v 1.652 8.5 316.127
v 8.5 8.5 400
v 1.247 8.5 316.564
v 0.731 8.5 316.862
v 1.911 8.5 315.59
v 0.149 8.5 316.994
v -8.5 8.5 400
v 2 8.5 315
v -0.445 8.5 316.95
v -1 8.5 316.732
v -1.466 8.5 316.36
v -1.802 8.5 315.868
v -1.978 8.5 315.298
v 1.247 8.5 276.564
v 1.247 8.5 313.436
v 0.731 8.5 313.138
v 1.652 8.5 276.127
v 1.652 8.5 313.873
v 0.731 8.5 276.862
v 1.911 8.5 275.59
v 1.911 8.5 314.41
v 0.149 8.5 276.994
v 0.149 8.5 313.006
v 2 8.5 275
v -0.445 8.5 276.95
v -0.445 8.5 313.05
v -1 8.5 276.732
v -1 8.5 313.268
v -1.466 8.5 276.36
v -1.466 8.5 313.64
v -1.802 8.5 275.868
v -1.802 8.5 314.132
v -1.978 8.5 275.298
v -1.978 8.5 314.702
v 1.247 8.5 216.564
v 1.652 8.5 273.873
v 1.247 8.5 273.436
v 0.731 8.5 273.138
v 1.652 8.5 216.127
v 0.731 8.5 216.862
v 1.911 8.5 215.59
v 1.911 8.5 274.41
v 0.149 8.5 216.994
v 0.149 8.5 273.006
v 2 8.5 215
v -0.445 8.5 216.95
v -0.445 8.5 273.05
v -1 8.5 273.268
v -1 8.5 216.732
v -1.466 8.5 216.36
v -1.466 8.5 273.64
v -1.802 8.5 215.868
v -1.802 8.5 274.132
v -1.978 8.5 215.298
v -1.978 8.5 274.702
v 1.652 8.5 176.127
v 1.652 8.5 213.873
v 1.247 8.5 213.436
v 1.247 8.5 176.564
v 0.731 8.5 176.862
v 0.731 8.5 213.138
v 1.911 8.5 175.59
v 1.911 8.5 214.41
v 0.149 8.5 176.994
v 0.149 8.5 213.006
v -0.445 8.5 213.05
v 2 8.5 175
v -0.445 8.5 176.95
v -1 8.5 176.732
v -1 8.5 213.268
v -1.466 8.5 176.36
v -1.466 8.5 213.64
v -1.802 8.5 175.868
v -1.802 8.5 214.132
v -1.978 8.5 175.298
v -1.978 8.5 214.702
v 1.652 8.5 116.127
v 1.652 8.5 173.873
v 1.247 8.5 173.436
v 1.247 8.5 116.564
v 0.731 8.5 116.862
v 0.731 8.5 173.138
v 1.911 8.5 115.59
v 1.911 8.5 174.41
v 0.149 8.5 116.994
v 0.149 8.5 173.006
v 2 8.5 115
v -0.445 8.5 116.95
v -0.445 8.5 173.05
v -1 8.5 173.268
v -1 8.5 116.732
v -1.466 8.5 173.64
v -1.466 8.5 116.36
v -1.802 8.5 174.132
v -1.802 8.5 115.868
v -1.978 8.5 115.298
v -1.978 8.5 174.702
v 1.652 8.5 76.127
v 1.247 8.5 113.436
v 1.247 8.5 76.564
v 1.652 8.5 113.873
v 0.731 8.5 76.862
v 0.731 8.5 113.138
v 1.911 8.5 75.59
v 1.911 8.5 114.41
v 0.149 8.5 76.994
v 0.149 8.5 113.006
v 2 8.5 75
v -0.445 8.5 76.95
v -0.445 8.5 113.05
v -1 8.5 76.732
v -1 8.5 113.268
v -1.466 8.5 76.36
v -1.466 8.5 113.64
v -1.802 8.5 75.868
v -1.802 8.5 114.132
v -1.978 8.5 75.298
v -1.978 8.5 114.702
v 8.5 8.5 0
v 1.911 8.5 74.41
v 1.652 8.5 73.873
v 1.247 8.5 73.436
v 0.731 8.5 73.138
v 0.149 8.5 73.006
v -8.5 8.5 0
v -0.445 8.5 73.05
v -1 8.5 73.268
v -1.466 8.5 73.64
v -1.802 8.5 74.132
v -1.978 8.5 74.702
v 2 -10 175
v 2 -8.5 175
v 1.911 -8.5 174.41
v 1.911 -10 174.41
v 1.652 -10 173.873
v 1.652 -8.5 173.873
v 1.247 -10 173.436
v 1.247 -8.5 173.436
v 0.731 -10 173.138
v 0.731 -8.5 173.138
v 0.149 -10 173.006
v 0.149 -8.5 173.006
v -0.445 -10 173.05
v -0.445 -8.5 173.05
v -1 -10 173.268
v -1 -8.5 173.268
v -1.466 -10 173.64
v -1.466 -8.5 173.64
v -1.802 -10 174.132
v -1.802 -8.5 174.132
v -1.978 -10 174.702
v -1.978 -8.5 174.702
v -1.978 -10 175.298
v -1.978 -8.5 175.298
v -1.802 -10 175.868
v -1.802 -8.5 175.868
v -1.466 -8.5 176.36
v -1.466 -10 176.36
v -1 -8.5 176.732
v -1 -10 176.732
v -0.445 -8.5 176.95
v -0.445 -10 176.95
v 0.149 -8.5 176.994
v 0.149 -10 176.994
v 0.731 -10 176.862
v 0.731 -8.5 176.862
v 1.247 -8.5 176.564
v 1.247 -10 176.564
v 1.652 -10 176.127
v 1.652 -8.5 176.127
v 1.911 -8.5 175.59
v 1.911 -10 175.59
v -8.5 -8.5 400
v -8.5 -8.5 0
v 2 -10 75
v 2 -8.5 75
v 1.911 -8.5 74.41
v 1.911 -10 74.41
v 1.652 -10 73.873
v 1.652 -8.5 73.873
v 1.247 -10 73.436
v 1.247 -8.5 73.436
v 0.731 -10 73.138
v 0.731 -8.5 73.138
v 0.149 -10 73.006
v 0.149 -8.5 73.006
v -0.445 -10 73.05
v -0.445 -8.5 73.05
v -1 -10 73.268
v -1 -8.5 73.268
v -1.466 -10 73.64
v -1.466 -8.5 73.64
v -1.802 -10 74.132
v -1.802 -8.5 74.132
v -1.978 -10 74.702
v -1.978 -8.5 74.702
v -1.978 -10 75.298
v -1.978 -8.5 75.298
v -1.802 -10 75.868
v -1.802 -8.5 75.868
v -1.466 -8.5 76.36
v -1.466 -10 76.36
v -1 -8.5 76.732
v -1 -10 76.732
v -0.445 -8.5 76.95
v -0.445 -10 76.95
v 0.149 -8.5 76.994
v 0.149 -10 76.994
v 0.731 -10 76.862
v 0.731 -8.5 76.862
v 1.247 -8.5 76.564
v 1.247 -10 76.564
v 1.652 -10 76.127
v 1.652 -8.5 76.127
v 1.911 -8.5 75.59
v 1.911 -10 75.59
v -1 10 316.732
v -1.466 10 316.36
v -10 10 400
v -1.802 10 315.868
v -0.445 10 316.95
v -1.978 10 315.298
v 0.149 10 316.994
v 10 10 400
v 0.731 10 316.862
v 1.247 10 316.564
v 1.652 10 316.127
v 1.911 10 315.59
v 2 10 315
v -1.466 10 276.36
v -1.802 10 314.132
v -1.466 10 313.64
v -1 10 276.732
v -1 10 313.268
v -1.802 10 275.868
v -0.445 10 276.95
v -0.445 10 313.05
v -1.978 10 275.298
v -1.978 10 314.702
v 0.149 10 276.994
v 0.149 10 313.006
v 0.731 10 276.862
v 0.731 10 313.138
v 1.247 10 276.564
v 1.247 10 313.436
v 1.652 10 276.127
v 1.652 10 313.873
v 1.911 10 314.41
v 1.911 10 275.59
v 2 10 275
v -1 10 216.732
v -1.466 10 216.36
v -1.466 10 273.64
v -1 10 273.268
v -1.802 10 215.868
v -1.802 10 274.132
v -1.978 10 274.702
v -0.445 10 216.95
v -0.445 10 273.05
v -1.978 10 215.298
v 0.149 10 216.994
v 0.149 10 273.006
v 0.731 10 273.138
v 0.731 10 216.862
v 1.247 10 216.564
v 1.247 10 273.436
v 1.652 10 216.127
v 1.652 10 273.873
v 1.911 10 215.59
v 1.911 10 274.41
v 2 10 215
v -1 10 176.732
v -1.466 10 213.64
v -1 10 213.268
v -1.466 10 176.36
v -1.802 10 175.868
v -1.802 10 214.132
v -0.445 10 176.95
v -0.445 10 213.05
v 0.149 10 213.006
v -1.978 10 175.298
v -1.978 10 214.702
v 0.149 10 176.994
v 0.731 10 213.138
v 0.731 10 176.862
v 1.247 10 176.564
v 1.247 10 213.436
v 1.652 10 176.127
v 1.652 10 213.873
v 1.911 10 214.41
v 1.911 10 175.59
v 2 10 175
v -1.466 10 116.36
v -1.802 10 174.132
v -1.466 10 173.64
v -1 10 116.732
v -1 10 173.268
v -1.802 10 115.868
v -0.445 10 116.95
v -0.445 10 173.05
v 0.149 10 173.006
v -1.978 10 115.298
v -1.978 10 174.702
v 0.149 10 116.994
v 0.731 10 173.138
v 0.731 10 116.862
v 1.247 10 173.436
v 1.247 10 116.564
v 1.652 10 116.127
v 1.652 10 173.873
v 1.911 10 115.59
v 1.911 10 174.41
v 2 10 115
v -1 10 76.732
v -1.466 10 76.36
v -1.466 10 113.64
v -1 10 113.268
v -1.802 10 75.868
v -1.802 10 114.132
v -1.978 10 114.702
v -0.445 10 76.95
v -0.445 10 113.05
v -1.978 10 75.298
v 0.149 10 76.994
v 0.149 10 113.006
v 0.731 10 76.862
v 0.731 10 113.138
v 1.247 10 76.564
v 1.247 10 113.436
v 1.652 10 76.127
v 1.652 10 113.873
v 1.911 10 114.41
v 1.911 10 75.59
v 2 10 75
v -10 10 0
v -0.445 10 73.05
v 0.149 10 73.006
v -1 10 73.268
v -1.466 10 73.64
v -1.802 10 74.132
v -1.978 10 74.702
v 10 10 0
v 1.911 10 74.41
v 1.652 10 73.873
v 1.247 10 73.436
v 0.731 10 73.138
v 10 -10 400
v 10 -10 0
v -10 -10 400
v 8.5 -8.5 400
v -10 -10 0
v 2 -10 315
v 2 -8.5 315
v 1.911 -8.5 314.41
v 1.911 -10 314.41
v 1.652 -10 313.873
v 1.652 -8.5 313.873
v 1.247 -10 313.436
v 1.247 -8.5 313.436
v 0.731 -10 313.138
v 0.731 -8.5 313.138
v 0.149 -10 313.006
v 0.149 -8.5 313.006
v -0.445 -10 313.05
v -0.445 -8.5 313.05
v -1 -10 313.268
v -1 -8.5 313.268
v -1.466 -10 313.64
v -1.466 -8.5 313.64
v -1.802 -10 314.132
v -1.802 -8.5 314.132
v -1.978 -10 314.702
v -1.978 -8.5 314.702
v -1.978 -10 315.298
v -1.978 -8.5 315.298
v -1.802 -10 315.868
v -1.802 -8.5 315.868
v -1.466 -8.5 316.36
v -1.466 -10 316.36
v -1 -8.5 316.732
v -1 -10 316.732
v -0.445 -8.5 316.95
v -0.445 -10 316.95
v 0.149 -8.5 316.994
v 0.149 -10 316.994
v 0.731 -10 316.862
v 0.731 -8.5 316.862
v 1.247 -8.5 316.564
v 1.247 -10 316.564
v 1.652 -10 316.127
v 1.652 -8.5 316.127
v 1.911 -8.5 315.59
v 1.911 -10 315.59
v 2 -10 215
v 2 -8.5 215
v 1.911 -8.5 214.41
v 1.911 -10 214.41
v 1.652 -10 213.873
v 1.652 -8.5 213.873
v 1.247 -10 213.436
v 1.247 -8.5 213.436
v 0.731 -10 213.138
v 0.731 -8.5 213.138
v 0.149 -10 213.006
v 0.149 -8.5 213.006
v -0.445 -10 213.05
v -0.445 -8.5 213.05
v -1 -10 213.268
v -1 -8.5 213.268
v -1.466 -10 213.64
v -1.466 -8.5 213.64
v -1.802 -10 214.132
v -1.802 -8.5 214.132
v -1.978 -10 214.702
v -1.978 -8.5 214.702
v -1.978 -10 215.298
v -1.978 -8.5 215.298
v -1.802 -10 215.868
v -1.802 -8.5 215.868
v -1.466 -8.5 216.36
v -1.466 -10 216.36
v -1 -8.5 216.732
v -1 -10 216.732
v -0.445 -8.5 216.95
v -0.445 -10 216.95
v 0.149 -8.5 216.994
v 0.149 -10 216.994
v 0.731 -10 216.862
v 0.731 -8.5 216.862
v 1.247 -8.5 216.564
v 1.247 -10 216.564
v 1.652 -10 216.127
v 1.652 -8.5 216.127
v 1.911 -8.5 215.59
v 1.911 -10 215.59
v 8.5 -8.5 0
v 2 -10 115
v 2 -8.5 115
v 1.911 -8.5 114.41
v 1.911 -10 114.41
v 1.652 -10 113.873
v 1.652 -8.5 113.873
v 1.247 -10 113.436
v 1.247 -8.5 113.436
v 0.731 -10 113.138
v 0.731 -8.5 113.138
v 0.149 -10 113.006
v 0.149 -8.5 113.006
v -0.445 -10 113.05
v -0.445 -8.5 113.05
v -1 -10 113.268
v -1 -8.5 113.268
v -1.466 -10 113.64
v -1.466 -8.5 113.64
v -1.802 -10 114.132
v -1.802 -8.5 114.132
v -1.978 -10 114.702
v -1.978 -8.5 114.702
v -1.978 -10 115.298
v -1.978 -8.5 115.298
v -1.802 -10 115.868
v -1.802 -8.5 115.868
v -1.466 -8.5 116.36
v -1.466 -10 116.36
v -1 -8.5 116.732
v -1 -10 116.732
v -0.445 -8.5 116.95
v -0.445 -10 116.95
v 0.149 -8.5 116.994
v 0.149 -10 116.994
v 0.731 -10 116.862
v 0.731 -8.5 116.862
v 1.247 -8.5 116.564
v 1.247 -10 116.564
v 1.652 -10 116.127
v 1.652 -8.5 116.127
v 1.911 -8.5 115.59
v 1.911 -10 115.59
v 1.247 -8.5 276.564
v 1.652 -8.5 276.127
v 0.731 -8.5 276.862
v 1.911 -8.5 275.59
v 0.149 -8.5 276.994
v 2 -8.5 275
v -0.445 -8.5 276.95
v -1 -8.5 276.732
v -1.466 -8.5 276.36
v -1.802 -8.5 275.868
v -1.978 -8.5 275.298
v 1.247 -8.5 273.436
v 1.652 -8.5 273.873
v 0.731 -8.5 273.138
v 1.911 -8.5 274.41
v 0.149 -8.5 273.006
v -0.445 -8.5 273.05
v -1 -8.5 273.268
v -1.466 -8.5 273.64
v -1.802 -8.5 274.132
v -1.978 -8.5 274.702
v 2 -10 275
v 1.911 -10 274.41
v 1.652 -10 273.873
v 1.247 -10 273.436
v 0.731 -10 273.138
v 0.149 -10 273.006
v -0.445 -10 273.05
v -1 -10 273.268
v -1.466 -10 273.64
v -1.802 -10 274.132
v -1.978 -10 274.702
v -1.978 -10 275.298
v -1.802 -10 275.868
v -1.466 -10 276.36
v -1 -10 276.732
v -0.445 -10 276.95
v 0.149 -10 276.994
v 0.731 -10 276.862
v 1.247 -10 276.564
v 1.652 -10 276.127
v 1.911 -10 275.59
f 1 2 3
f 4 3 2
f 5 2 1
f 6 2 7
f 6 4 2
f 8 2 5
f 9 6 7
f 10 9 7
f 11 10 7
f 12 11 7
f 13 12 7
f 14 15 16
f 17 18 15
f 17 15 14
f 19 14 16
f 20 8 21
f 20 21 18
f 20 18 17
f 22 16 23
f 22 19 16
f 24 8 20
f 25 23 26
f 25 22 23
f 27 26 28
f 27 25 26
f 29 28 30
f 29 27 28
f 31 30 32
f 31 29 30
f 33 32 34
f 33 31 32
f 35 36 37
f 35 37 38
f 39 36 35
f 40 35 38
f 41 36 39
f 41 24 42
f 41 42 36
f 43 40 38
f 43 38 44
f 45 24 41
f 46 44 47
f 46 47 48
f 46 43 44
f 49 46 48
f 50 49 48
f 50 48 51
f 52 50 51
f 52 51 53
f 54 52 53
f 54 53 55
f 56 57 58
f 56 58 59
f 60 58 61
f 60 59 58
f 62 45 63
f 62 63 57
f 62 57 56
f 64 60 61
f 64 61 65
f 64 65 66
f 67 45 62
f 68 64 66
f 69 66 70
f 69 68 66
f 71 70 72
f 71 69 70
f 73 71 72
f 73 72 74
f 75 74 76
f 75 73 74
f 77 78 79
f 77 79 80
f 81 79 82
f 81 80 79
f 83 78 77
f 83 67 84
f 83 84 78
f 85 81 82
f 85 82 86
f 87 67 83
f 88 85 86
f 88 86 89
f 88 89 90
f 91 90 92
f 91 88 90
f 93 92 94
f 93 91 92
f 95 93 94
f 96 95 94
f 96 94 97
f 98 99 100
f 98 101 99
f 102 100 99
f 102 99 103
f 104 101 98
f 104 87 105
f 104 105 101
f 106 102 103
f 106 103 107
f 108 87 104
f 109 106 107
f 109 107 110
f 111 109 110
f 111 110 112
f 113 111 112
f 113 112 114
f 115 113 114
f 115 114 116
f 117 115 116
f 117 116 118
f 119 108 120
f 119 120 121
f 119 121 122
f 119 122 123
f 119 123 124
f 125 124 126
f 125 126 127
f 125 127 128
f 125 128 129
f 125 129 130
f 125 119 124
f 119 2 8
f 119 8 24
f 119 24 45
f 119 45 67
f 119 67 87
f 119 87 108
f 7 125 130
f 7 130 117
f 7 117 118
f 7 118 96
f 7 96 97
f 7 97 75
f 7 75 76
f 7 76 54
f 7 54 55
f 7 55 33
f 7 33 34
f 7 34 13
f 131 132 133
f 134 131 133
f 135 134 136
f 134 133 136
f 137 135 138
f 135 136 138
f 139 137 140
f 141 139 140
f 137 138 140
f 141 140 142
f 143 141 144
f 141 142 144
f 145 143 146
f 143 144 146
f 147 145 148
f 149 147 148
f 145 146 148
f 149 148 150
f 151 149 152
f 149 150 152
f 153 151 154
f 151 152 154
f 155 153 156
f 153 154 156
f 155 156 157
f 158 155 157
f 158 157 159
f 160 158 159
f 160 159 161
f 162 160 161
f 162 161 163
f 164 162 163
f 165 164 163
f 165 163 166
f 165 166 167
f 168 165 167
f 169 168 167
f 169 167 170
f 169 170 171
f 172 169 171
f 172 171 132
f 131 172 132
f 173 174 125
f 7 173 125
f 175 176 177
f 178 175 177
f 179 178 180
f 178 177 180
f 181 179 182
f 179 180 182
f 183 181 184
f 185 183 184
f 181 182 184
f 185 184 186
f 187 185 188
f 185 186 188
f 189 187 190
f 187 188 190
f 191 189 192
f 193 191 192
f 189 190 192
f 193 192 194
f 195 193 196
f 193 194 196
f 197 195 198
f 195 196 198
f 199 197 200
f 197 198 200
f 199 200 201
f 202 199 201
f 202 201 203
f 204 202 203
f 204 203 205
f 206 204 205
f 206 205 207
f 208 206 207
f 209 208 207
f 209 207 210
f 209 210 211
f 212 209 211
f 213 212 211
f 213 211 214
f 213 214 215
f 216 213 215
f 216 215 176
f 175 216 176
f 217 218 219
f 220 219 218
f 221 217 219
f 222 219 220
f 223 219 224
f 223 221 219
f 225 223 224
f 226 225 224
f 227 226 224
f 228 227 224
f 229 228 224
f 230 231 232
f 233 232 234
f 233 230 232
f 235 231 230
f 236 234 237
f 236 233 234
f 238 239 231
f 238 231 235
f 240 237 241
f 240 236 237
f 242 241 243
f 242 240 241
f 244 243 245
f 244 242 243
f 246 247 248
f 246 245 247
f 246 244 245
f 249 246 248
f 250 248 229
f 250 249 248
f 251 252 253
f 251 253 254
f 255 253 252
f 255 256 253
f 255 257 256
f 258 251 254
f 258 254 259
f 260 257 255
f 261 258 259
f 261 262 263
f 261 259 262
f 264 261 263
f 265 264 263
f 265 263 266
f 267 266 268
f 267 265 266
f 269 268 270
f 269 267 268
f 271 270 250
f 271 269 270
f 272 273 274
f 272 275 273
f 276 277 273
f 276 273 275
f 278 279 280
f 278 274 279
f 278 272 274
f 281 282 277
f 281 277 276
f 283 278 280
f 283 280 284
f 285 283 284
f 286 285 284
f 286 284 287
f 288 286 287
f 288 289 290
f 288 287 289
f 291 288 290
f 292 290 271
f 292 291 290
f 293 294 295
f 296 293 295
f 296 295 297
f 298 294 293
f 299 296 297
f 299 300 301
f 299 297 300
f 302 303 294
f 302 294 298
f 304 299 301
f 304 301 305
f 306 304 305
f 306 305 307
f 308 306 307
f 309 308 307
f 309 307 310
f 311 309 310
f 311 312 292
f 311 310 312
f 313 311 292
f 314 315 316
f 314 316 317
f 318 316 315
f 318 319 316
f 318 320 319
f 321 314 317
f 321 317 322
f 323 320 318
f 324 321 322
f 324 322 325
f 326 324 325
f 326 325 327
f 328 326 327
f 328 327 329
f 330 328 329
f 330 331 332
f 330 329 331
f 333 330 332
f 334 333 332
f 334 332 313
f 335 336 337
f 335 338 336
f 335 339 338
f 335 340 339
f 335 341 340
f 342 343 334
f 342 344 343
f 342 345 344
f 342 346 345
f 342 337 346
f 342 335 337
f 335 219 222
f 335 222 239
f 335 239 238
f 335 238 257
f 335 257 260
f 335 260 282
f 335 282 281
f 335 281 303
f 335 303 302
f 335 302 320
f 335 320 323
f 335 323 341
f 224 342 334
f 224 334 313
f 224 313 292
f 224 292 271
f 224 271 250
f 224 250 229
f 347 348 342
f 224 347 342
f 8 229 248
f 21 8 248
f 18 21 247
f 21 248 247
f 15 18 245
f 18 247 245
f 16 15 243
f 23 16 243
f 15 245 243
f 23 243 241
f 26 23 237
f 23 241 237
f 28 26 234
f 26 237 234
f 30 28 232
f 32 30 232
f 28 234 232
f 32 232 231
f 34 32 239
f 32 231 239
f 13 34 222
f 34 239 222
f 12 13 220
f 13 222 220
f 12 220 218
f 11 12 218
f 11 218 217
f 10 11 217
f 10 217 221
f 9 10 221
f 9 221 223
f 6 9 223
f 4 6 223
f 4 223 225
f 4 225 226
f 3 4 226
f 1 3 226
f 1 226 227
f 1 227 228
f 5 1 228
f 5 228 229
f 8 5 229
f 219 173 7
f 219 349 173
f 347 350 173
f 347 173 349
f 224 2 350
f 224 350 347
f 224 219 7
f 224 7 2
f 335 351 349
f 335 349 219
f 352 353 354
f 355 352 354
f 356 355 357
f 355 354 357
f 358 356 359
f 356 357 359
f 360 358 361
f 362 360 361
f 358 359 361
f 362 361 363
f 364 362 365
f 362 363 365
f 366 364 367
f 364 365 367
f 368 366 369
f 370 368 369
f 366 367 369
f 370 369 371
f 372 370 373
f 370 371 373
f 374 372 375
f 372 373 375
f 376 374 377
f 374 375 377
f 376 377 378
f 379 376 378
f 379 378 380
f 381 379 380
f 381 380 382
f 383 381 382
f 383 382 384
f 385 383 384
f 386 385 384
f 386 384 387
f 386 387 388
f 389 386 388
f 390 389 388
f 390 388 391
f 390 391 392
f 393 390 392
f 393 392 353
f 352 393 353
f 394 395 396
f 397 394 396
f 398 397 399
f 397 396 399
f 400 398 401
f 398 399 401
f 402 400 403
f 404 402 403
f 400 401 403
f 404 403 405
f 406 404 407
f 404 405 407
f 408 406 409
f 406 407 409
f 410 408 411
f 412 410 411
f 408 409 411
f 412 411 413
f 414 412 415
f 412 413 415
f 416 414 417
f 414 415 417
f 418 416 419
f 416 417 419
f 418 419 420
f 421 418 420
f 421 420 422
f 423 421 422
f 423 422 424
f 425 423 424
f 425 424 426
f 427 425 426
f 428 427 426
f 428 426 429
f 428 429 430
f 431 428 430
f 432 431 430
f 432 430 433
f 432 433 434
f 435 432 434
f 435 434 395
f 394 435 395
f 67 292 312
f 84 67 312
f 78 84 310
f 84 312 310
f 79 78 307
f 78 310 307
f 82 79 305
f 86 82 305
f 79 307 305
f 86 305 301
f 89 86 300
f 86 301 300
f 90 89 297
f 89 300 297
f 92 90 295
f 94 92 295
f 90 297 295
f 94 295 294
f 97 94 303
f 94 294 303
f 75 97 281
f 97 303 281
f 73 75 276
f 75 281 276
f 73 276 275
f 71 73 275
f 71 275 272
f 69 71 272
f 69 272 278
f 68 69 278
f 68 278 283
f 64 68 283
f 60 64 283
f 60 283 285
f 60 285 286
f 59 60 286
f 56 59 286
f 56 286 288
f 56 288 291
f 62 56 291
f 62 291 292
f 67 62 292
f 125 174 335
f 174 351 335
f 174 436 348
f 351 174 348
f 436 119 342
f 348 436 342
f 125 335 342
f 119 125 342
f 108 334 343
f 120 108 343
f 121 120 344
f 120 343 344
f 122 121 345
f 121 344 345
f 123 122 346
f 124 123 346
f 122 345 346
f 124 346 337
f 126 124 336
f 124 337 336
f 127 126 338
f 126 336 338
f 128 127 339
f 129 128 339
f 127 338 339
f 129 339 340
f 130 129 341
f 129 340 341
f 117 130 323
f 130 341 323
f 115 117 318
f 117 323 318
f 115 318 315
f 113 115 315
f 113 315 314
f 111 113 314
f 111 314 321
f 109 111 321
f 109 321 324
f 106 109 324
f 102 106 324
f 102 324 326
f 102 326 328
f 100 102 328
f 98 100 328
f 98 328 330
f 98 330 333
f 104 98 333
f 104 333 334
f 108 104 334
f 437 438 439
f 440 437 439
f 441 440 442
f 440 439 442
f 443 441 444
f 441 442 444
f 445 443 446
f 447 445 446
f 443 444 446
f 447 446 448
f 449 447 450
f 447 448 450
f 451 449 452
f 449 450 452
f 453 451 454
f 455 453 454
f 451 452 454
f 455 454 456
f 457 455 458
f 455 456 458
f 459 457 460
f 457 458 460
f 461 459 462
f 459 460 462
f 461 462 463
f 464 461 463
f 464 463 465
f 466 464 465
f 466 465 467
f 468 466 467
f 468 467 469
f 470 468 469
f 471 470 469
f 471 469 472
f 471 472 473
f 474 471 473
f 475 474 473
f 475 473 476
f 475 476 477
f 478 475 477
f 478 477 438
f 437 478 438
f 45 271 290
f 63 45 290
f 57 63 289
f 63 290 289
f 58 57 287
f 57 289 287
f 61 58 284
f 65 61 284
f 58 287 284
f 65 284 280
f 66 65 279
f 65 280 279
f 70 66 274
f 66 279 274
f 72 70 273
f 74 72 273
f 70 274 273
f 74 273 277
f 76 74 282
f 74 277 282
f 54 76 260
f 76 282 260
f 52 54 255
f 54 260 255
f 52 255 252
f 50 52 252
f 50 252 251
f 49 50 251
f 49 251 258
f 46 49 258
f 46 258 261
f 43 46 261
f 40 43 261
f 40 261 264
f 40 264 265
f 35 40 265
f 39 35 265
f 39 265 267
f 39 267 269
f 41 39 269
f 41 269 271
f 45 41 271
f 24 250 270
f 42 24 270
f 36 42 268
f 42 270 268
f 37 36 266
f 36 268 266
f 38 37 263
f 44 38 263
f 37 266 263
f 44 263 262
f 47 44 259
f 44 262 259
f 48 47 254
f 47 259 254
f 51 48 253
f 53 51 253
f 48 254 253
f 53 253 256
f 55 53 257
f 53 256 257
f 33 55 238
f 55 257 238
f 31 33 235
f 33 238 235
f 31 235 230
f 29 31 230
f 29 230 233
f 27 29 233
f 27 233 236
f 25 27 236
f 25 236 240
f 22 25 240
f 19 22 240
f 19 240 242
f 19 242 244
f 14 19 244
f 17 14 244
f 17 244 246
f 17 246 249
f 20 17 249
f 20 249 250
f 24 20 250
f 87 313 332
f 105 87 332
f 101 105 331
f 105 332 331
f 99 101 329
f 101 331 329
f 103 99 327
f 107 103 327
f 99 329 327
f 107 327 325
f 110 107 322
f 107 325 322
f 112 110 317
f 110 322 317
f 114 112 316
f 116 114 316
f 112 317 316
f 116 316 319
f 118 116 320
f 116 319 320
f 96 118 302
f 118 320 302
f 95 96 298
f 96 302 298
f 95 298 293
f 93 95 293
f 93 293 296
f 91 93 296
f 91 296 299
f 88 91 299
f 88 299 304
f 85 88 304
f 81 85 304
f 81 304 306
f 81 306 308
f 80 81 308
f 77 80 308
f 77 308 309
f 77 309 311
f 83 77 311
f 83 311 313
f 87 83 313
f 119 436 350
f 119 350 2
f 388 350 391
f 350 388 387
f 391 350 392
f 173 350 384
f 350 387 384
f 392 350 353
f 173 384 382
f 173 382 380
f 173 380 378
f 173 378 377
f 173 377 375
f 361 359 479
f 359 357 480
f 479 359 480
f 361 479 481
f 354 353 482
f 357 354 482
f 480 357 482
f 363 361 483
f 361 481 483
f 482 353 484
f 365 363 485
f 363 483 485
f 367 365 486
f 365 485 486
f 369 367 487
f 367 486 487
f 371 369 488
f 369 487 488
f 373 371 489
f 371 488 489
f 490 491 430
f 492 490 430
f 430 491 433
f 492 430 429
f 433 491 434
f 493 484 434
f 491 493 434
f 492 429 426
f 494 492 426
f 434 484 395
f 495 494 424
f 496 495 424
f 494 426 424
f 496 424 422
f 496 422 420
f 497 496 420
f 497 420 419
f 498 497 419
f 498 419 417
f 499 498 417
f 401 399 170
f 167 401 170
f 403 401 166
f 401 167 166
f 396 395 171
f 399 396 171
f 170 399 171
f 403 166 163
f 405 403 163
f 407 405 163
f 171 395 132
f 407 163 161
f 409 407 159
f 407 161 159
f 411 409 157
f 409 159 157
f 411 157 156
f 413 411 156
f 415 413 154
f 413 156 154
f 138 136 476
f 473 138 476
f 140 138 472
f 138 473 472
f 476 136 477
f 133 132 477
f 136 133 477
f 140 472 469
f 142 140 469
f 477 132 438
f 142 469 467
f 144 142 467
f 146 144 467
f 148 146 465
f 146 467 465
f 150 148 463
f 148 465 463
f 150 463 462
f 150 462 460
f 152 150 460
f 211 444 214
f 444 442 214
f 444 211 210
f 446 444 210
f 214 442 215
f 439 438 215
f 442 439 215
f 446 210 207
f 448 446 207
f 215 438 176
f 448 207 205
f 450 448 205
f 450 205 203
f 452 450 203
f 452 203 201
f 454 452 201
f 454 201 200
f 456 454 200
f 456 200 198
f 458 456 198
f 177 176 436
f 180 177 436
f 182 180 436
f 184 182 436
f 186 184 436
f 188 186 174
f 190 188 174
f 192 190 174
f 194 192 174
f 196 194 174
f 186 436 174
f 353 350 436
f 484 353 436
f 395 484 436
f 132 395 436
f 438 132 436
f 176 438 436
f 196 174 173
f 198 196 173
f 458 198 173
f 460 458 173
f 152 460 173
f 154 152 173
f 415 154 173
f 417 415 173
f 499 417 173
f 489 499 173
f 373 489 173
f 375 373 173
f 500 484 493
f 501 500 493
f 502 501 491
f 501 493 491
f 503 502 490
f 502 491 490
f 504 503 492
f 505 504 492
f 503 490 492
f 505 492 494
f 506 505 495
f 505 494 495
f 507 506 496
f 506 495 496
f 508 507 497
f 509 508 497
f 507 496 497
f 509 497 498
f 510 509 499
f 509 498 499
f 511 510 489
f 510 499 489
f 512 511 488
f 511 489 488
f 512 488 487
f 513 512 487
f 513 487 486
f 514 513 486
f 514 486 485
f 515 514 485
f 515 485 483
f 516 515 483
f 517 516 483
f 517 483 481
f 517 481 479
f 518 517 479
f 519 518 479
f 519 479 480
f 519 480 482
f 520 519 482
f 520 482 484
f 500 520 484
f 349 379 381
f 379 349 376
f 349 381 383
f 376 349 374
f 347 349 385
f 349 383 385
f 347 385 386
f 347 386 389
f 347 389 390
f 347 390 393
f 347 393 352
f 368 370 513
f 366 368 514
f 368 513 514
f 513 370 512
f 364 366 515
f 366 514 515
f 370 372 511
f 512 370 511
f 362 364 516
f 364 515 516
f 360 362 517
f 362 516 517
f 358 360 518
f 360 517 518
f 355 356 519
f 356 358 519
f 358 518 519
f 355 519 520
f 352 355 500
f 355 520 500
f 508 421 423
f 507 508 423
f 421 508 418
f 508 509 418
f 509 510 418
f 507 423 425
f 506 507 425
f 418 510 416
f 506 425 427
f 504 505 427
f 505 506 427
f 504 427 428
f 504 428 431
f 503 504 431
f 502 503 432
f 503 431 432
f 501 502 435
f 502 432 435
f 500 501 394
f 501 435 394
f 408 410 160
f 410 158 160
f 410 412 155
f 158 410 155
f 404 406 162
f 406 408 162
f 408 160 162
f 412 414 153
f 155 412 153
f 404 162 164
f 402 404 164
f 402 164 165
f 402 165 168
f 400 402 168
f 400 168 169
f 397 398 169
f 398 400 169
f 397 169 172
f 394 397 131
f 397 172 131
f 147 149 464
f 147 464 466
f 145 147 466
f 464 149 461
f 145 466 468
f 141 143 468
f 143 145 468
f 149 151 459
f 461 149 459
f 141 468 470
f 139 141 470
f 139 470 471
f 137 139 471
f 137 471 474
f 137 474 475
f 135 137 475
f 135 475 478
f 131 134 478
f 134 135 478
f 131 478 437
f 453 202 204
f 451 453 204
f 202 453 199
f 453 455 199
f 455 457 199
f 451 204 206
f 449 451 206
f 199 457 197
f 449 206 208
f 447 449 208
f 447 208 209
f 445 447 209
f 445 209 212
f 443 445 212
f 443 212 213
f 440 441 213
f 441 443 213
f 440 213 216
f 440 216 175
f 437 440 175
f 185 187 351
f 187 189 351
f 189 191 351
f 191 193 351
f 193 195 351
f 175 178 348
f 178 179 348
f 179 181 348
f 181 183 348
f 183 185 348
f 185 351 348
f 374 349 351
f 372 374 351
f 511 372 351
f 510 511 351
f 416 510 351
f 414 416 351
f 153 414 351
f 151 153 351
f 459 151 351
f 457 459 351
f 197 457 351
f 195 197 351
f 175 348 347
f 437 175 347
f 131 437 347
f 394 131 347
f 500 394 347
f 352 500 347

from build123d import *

# Parameters (mm, degrees)
SKETCH1_W           = 20
SKETCH1_H           = 20
BOSS_EXTRUDE1_DEPTH = 400
SKETCH2_W           = 17
SKETCH2_H           = 17
CUT_EXTRUDE1_DEPTH  = 400
SKETCH3_R           = 2
CUT_EXTRUDE2_DEPTH  = 25
SKETCH4_R           = 2
CUT_EXTRUDE3_DEPTH  = 25
LPATTERN1_COUNT     = 3
LPATTERN1_PITCH     = 100


with BuildPart() as part:
    # Sketch1 → Boss-Extrude1 (new body)
    with BuildSketch(Plane.XY):
        Rectangle(SKETCH1_W, SKETCH1_H)
    extrude(amount=BOSS_EXTRUDE1_DEPTH)

    # Sketch2 → Cut-Extrude1 (cut)
    with BuildSketch(Plane(origin=(0, 0, 0), x_dir=(-1, 0, 0), z_dir=(0, 0, -1))):
        Rectangle(SKETCH2_W, SKETCH2_H)
    extrude(amount=-CUT_EXTRUDE1_DEPTH, mode=Mode.SUBTRACT)

    # Sketch3 → Cut-Extrude2 (cut)
    with BuildSketch(Plane(origin=(0, 10, 0), x_dir=(1, 0, 0), z_dir=(0, 1, 0))):
        with Locations((0, -75)):
            Circle(SKETCH3_R)
    cut_extrude2 = extrude(amount=-CUT_EXTRUDE2_DEPTH, mode=Mode.SUBTRACT)

    # Sketch4 → Cut-Extrude3 (cut)
    with BuildSketch(Plane(origin=(0, 10, 0), x_dir=(1, 0, 0), z_dir=(0, 1, 0))):
        with Locations((0, -115)):
            Circle(SKETCH4_R)
    cut_extrude3 = extrude(amount=-CUT_EXTRUDE3_DEPTH, mode=Mode.SUBTRACT)

    # LPattern1: Cut-Extrude2, Cut-Extrude3 ×3
    with Locations(*[(0, 0, i * LPATTERN1_PITCH) for i in range(1, LPATTERN1_COUNT)]):
        add(cut_extrude2, mode=Mode.SUBTRACT)
        add(cut_extrude3, mode=Mode.SUBTRACT)


solid = part.part
